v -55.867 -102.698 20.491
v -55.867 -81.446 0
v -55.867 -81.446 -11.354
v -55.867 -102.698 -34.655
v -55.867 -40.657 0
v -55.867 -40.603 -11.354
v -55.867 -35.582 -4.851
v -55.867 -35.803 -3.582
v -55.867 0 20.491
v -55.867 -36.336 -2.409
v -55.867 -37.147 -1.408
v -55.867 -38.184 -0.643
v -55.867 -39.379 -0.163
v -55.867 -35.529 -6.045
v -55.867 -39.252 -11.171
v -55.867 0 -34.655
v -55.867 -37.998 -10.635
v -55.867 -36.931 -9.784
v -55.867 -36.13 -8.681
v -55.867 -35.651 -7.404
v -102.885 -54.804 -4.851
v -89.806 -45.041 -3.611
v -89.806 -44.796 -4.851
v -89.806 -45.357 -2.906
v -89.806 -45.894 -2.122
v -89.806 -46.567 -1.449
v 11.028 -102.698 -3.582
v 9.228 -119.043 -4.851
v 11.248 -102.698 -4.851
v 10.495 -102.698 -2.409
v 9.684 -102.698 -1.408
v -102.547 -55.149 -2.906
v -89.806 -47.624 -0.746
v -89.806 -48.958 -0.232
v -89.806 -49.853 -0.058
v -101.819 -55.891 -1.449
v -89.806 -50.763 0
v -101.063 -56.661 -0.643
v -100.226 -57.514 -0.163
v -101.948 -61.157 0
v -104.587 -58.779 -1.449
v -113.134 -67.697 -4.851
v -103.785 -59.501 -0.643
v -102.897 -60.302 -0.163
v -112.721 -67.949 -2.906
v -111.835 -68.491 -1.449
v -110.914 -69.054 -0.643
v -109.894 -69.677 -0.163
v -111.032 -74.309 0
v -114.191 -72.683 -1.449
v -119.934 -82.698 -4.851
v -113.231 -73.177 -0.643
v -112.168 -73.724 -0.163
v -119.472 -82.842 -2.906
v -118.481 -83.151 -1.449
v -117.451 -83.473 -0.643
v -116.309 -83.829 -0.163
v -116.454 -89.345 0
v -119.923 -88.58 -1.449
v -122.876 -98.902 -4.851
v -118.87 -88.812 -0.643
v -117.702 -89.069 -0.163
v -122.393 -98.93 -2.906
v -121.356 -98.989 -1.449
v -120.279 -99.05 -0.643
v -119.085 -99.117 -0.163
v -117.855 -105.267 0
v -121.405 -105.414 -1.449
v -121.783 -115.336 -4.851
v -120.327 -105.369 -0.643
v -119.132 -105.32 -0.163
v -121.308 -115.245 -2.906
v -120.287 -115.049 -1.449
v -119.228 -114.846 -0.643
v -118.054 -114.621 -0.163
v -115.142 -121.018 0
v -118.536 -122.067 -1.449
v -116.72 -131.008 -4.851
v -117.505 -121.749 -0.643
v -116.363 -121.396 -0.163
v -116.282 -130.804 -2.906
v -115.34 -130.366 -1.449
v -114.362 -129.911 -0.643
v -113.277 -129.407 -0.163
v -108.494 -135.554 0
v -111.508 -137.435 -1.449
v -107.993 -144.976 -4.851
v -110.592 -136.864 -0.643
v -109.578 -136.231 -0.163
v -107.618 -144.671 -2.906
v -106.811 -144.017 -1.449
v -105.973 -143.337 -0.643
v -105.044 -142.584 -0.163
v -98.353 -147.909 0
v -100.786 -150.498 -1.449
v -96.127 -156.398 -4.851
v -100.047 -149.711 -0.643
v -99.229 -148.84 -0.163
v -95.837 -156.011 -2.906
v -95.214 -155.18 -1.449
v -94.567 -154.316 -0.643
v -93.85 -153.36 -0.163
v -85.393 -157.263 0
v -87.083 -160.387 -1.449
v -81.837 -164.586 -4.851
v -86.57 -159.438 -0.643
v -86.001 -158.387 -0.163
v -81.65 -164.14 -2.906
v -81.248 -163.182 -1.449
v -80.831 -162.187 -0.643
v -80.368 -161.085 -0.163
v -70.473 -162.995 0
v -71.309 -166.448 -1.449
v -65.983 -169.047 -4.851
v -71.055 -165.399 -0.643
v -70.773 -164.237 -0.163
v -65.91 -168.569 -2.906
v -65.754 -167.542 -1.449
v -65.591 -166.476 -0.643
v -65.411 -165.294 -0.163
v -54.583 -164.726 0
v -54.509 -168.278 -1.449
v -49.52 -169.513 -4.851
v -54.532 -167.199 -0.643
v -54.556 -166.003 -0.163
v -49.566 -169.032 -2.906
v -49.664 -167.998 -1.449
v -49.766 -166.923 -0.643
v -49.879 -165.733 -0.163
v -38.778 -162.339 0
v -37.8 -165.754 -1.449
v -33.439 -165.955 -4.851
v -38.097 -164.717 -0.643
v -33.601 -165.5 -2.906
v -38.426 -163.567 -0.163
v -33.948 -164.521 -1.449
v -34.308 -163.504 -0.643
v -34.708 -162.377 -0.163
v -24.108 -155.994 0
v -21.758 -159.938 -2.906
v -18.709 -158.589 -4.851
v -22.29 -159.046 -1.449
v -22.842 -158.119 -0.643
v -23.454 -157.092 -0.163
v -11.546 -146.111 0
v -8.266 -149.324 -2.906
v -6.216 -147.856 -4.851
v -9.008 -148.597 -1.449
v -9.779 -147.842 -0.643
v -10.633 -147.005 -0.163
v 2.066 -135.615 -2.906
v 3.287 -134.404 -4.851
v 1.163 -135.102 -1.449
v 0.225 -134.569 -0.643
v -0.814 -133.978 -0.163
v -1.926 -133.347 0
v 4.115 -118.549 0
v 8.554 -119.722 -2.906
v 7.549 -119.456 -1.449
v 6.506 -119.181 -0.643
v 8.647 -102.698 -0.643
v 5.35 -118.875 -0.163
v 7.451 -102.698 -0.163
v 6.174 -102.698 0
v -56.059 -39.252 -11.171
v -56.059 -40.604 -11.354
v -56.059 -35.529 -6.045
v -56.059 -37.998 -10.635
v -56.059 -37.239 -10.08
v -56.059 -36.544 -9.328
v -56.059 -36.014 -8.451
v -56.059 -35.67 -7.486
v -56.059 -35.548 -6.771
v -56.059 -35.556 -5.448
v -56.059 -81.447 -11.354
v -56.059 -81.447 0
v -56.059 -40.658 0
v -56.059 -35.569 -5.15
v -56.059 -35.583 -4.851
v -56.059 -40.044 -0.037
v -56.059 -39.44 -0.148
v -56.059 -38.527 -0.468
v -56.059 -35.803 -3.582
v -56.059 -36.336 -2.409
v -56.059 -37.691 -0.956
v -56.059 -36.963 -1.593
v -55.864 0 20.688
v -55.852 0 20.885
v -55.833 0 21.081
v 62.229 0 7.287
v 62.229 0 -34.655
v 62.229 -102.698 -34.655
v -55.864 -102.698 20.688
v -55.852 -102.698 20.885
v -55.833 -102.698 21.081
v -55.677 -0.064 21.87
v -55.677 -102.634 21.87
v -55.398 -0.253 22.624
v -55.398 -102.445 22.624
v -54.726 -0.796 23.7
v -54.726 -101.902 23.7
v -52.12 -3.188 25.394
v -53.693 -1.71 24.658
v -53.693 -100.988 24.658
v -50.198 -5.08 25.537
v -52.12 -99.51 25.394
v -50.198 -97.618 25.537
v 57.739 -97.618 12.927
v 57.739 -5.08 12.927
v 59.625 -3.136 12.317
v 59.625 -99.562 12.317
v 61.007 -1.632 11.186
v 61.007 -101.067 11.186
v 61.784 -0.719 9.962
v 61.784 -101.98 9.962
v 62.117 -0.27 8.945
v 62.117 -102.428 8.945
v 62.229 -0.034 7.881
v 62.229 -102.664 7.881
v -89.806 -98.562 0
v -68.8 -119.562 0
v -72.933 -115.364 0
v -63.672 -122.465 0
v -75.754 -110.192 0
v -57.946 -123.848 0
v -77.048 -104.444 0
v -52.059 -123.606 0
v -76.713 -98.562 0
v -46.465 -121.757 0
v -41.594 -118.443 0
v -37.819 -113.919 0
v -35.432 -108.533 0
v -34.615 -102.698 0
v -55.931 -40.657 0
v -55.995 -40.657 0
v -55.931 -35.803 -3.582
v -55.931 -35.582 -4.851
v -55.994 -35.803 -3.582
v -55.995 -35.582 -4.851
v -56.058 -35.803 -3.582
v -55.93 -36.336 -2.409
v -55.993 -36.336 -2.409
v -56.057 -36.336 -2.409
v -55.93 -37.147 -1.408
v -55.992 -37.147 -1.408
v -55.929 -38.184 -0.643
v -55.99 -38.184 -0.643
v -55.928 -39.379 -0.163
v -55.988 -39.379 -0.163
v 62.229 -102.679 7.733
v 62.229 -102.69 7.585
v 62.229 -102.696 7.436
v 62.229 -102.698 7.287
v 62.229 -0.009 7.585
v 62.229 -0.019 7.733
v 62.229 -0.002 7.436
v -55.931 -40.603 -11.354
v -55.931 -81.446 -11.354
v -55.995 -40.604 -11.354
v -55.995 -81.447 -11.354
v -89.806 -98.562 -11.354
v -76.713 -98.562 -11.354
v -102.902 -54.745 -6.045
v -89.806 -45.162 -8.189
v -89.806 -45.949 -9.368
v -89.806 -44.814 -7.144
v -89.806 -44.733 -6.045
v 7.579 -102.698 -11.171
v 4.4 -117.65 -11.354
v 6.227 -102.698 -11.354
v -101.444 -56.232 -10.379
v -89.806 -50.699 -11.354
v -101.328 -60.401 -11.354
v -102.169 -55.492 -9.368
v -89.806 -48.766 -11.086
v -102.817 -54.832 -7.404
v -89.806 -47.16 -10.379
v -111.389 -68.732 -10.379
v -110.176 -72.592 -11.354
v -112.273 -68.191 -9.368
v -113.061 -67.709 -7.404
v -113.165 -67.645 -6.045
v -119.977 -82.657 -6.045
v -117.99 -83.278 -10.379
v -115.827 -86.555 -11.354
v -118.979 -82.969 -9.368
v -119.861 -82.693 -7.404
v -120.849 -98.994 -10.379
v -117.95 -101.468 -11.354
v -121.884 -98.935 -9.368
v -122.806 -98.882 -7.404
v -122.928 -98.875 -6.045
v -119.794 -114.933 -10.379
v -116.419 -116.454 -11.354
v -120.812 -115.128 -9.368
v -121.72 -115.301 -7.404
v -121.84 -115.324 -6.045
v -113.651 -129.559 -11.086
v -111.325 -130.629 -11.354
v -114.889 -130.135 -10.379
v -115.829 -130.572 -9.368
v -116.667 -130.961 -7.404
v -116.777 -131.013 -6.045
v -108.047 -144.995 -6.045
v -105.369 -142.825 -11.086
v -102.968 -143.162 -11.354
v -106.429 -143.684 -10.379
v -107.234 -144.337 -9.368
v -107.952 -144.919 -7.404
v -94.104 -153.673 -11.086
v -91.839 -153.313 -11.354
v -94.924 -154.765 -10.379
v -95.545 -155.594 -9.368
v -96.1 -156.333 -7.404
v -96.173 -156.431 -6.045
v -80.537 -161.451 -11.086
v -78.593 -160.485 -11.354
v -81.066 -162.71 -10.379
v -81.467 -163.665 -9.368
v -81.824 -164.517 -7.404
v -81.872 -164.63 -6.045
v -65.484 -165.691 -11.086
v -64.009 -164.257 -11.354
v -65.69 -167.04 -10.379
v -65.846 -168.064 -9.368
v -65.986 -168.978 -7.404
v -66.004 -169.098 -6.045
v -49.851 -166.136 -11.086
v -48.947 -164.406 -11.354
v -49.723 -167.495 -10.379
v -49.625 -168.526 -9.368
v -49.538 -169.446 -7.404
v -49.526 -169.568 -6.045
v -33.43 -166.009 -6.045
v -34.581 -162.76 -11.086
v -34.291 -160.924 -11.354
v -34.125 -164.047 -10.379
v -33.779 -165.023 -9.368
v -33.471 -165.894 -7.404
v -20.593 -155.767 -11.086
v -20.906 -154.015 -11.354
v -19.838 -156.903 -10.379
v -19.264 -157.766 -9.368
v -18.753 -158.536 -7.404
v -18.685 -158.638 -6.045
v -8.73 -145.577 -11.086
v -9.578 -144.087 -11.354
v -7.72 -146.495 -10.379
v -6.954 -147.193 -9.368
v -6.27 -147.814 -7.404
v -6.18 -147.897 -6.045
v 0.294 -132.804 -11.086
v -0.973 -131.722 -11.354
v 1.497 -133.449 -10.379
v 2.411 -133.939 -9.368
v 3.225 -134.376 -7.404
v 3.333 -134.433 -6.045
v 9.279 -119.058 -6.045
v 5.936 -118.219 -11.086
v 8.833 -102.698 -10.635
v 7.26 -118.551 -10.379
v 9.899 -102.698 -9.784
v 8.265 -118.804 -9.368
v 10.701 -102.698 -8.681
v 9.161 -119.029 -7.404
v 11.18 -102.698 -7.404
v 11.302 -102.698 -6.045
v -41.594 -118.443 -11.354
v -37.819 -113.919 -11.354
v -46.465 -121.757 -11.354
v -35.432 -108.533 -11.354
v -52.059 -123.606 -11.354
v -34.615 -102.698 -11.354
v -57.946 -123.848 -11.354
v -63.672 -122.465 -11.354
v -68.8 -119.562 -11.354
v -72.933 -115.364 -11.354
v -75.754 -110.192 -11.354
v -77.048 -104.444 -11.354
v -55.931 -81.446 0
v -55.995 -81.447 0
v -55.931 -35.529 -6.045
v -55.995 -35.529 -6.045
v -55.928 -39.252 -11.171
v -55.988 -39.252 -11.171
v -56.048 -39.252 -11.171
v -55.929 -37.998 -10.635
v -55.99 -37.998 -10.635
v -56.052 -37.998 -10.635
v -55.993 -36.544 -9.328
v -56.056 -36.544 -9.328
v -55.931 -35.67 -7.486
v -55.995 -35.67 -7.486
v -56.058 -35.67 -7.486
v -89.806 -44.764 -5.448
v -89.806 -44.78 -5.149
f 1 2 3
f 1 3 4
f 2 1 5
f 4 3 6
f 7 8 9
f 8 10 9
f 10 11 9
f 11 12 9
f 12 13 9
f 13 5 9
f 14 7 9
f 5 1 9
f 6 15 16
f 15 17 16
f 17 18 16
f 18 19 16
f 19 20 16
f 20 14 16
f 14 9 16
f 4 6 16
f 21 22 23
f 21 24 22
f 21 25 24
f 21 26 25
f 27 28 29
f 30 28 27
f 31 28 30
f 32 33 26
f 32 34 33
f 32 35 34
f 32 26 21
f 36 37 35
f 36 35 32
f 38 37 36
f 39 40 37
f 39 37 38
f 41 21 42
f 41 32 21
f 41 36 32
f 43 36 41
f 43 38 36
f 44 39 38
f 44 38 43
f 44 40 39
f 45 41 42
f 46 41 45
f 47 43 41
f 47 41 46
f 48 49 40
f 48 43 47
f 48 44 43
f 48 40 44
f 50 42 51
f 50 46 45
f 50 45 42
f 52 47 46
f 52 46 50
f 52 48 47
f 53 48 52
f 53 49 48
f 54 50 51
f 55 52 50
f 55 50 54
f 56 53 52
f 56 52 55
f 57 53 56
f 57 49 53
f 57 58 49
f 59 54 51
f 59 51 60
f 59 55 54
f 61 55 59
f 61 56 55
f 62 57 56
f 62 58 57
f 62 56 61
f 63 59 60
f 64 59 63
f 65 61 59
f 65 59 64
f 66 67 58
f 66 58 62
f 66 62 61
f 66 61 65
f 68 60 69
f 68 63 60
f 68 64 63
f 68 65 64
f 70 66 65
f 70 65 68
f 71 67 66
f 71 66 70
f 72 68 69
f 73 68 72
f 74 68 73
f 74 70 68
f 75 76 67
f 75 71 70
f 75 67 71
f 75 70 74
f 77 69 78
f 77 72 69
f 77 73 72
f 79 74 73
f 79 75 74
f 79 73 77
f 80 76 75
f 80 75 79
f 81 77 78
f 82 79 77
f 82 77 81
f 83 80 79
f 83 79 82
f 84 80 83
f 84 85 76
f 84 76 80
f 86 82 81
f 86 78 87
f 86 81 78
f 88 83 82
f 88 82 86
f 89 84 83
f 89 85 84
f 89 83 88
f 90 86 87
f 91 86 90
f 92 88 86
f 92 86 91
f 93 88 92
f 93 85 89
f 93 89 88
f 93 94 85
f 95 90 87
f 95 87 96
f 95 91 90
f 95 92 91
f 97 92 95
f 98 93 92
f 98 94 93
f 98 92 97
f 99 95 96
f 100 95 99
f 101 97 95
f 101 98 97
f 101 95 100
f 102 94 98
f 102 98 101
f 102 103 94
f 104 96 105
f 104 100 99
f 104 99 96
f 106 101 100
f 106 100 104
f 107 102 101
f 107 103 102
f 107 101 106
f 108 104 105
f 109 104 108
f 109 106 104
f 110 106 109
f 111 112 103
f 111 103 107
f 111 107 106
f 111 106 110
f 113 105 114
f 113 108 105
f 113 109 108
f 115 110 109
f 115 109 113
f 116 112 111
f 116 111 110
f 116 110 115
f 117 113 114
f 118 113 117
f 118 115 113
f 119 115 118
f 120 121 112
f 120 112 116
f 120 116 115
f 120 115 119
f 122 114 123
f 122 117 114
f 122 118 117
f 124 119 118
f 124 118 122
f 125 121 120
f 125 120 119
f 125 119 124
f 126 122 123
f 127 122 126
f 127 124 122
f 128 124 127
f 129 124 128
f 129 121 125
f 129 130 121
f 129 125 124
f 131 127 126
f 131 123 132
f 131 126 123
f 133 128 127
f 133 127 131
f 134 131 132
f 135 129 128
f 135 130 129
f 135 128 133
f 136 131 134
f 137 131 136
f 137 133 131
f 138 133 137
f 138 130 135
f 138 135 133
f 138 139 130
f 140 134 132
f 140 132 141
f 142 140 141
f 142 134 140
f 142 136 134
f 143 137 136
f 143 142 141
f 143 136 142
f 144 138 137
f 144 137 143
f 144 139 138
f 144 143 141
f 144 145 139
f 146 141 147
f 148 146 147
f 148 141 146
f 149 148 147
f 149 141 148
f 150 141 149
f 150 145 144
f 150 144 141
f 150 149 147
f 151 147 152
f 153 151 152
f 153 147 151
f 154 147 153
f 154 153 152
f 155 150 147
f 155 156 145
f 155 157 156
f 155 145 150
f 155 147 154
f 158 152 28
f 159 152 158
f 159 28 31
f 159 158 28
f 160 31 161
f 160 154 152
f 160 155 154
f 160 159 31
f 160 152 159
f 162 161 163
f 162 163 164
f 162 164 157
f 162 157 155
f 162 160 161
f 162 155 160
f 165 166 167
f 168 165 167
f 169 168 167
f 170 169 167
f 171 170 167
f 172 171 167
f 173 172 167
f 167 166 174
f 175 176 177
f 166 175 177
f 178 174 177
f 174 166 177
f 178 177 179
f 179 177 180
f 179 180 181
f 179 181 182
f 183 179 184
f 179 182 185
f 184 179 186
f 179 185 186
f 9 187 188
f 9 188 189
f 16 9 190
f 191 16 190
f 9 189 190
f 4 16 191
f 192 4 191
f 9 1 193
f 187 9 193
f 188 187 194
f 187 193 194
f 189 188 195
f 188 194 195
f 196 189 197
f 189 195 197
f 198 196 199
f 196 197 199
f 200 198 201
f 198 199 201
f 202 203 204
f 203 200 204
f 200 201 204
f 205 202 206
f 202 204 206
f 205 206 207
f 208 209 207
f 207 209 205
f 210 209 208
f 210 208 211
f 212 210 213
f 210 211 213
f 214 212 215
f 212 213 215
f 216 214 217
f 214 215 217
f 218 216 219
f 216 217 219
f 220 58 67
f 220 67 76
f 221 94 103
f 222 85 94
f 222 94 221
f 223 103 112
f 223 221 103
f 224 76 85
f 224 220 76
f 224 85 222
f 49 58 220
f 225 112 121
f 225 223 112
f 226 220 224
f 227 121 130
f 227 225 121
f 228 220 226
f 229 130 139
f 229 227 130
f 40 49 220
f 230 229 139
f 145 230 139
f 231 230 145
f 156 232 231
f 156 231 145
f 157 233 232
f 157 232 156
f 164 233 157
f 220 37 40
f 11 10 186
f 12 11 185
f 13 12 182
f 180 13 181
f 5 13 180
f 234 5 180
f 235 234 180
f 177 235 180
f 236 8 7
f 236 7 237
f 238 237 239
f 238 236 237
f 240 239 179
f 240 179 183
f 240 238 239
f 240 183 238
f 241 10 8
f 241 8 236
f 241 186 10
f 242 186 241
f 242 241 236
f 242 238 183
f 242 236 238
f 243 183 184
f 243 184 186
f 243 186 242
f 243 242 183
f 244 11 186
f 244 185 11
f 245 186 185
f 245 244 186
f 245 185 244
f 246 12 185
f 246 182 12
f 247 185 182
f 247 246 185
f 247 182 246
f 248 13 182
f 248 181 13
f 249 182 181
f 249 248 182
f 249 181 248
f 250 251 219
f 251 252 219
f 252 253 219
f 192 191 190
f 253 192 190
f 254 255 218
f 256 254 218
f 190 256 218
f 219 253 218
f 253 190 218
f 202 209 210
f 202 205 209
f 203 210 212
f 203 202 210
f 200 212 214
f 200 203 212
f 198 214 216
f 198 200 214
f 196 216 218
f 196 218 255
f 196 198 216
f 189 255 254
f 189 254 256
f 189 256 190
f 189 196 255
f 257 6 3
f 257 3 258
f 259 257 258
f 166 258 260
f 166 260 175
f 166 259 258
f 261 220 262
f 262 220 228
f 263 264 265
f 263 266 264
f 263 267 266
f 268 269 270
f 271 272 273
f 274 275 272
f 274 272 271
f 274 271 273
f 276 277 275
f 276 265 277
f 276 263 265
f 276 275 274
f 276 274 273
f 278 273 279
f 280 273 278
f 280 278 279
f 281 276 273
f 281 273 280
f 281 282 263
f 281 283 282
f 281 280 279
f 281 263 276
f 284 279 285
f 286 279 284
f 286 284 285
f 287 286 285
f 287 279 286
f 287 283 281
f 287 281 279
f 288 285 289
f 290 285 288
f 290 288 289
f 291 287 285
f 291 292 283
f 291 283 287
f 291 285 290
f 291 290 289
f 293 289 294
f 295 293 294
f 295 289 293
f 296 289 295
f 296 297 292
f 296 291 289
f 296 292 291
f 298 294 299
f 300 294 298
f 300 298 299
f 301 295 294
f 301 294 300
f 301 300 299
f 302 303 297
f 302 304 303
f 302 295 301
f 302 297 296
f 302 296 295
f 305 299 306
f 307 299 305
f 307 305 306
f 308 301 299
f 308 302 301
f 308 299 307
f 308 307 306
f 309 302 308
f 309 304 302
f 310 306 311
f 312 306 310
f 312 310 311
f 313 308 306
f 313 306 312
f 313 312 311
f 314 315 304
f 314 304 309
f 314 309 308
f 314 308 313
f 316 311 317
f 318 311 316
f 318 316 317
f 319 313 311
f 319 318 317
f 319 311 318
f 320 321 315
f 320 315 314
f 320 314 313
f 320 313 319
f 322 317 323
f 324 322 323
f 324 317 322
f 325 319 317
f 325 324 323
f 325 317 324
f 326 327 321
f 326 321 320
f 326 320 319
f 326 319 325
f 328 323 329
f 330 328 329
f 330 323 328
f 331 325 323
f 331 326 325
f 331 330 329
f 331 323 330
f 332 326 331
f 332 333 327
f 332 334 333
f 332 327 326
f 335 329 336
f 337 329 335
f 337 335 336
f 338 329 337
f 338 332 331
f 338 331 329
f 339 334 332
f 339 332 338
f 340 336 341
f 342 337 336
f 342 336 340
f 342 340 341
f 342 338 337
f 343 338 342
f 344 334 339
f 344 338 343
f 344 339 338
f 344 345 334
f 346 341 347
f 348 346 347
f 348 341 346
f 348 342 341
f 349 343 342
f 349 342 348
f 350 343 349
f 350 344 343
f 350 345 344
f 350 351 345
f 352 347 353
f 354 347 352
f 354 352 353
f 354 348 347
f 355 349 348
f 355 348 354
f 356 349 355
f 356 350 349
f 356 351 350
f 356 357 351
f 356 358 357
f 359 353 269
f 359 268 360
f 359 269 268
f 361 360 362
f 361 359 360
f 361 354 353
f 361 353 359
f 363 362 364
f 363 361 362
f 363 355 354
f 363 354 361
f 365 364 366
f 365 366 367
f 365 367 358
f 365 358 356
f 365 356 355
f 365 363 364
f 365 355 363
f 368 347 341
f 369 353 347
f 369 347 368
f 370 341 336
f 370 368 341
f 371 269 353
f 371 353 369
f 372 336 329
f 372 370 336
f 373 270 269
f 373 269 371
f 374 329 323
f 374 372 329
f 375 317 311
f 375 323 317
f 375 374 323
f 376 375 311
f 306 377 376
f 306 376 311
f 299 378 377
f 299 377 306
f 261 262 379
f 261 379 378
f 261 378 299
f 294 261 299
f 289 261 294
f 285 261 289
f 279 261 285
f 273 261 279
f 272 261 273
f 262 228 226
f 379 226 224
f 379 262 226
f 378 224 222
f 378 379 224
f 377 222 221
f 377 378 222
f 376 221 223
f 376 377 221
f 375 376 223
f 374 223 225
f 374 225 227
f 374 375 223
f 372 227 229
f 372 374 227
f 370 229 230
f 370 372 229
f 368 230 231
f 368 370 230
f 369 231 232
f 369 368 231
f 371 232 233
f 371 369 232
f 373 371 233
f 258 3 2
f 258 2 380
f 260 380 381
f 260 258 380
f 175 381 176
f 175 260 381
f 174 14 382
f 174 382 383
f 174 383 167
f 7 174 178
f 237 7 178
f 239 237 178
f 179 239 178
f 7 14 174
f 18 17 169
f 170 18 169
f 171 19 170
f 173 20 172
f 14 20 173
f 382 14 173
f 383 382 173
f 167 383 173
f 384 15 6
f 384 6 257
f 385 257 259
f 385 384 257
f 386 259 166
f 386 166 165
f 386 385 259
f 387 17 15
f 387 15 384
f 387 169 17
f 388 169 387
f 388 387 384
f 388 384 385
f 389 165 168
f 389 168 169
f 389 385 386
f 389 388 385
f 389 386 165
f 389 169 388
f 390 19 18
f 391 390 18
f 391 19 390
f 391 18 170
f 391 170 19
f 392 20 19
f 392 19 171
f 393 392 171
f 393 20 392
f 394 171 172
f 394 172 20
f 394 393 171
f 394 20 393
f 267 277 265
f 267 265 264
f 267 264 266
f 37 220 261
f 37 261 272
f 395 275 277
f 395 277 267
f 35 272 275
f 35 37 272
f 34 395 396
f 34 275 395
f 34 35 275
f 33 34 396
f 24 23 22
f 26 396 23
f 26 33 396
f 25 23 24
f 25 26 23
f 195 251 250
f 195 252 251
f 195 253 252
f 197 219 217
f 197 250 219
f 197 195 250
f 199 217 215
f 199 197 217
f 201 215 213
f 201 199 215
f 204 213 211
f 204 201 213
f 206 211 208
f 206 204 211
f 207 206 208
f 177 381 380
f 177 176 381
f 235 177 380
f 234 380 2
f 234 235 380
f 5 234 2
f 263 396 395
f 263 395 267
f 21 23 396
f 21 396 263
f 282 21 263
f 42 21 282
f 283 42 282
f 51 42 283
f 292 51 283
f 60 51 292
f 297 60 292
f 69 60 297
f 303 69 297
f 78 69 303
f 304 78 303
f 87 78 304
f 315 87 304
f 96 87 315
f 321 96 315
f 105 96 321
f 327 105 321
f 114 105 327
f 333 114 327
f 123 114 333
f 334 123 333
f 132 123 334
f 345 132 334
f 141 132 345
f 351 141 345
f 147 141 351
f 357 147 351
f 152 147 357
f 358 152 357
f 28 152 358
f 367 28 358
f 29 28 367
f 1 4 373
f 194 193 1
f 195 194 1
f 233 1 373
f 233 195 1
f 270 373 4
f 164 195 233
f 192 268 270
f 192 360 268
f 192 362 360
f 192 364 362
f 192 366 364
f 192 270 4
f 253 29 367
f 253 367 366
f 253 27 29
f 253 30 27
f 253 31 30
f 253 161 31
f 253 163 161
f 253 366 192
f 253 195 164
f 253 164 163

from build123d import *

# Parameters (mm, degrees)
F1_DEPTH = 102.6981025934
F4_R     = 5.08
F5_W     = 33.7471216917
F5_H     = 65.5695050955
F6_DEPTH = 25.4


with BuildPart() as f1:
    # F0 (on Front) → F1 (new body)
    with BuildSketch(Plane.XZ):
        Polygon((62.229424715, -34.6546843648), (62.229424715, 12.4018825591), (-55.8673739433, 26.1995047331), (-55.8673739433, -34.6546843648), align=None)
    extrude(amount=F1_DEPTH)

    # F2 (on face) → F3 (revolve)
    with BuildSketch(Plane.XZ.offset(102.6981025934)):
        Polygon((-34.6154049039, -11.3538783044), (11.5415975451, -11.3538783044), (11.0295861959, 0), (-34.6154049039, 0), align=None)
    revolve(axis=Axis((-55.8673739433, -102.6981025934, -4.2275898159), (0, 0, 1)))

    # F4
    f4_edges = [f1.edges().sort_by_distance(p)[0] for p in [
        (62.229425, -51.349051, 12.401883),
        (-55.867374, -51.349051, 26.199505),
        (3.181025, 0, 19.300694),
        (3.181025, -102.698103, 19.300694),
        (-103.532715, -150.363443, -11.353878),
        (-103.170668, -150.001397, 0),
    ]]
    fillet(f4_edges, radius=F4_R)

    # F5 (on Top) → F6 (cut)
    with BuildSketch(Plane.XY):
        with Locations((-72.9322209954, -65.7769069076)):
            Rectangle(F5_W, F5_H)
    extrude(amount=-F6_DEPTH, mode=Mode.SUBTRACT)


solid = f1.part
